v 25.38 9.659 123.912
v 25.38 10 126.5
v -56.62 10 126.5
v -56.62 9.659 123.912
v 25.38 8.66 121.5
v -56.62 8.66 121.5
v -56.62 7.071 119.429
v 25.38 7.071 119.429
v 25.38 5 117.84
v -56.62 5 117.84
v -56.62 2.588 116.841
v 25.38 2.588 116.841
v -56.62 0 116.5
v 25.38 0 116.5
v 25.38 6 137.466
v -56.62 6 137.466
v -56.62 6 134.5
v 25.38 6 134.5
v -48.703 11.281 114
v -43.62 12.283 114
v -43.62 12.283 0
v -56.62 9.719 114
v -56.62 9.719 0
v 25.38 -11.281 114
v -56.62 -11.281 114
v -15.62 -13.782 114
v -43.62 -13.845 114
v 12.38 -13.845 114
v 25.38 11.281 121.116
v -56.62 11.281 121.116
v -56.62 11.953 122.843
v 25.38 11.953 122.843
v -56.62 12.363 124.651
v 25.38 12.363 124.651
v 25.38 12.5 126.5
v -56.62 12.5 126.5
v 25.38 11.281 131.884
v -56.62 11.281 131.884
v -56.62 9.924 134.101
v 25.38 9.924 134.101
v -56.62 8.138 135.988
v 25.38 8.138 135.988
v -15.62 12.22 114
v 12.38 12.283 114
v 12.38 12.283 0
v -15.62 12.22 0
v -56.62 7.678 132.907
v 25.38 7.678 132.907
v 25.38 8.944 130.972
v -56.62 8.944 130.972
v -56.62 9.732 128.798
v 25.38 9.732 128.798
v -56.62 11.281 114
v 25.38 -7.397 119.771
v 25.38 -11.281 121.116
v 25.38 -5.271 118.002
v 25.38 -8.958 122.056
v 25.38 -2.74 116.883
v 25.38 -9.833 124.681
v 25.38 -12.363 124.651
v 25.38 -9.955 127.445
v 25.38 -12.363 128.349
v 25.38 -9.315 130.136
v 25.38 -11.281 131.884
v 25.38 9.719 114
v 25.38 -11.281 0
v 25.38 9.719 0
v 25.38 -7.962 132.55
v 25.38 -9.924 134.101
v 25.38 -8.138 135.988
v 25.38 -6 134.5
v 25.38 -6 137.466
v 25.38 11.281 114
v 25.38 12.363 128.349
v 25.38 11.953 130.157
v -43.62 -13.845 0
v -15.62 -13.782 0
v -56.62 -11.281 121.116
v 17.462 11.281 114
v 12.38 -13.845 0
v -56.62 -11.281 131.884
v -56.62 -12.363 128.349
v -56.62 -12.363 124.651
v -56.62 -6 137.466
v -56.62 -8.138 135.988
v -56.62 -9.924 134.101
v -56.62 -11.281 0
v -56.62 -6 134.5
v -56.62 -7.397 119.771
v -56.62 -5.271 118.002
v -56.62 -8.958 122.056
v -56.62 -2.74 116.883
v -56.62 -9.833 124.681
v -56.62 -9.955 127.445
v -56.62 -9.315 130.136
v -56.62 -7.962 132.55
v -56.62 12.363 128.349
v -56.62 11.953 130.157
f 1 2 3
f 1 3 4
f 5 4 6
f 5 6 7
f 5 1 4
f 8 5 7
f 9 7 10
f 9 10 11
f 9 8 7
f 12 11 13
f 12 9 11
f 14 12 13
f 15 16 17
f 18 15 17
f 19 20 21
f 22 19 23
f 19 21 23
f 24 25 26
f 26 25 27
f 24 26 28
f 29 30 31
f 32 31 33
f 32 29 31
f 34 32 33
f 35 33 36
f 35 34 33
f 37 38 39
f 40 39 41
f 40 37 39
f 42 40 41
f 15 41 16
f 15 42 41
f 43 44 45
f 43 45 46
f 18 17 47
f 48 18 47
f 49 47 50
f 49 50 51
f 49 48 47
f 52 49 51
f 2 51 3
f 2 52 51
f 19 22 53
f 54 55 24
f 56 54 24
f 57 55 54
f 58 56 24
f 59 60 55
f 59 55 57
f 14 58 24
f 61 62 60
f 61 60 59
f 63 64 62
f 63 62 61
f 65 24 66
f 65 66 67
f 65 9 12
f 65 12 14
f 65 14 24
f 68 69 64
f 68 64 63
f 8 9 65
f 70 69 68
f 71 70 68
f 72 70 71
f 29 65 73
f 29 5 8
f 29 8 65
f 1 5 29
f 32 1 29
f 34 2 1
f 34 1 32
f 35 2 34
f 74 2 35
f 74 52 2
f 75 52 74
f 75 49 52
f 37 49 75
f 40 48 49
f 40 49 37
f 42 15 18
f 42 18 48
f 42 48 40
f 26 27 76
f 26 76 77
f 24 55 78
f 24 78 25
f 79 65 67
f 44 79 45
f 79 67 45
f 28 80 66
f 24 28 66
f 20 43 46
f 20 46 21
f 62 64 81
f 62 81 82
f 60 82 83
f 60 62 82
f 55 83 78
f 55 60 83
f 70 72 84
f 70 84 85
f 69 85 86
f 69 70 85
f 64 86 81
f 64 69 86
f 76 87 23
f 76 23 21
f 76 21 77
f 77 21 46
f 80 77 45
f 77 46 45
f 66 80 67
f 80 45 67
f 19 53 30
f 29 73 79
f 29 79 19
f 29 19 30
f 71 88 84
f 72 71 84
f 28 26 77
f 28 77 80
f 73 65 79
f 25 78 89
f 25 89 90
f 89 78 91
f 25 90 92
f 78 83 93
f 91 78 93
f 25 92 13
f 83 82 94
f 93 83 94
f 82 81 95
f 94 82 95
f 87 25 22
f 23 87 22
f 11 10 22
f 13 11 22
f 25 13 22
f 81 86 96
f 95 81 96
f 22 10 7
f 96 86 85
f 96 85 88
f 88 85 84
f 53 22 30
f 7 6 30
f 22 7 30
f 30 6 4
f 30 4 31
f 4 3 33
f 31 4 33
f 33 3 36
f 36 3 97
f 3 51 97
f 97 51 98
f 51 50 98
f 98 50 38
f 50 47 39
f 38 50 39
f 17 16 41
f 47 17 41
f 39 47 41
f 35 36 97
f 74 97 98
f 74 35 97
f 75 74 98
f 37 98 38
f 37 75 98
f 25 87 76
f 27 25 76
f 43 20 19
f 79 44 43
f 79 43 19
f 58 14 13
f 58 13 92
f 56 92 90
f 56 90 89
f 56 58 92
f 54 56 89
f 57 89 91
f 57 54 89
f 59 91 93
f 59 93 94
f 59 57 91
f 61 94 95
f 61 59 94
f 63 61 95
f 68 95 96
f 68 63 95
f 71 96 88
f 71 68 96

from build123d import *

# Parameters (mm, degrees)
F1_DEPTH = 114
F3_DEPTH = 82


with BuildPart() as f1:
    # F0 (on Top) → F1 (new body)
    with BuildSketch(Plane.XY):
        Polygon((-56.6203880661, 9.7190998064), (25.3796119339, 9.7190998064), (12.379645281, 12.2834371362), (-15.6203880661, 12.22001634), (-43.6204214132, 12.2834371362), align=None)
        Polygon((-15.6203880661, -0.7809001936), (25.3796119339, -0.7809001936), (25.3796119339, 9.7190998064), (-56.6203880661, 9.7190998064), (-56.6203880661, -0.7809001936), align=None)
        Polygon((25.3796119339, -11.2809001936), (25.3796119339, -0.7809001936), (-15.6203880661, -0.7809001936), (-56.6203880661, -0.7809001936), (-56.6203880661, -11.2809001936), align=None)
        Polygon((12.379645281, -13.8452375234), (25.3796119339, -11.2809001936), (-56.6203880661, -11.2809001936), (-43.6204214132, -13.8452375234), (-15.6203880661, -13.7818167272), align=None)
    extrude(amount=F1_DEPTH)

    # F2 (on face) → F3 (join)
    with BuildSketch(Plane.YZ.offset(25.3796119339)):
        with BuildLine():
            ThreePointArc((-11.2809001936, 131.8843561195), (-12.5, 126.5), (-11.2809001936, 121.1156438805))
            Line((-11.2809001936, 121.1156438805), (-11.2809001936, 131.8843561195))
        make_face()
        with BuildLine():
            Line((-11.2809001936, 114), (0, 114))
            ThreePointArc((0, 114), (-6.6687910638, 115.9275250888), (-11.2809001936, 121.1156438805))
            Line((-11.2809001936, 121.1156438805), (-11.2809001936, 114))
        make_face()
        with BuildLine():
            ThreePointArc((-11.2809001936, 121.1156438805), (-6.6687910638, 115.9275250888), (0, 114))
            Line((0, 114), (0, 116.5))
            ThreePointArc((0, 116.5), (-9.4868329805, 123.3377223398), (-6, 134.5))
            Line((-6, 134.5), (-6, 137.4658560997))
            ThreePointArc((-6, 137.4658560997), (-9.0799594373, 135.0909450363), (-11.2809001936, 131.8843561195))
            Line((-11.2809001936, 131.8843561195), (-11.2809001936, 121.1156438805))
        make_face()
        with BuildLine():
            Line((0, 116.5), (0, 114))
            ThreePointArc((0, 114), (6.6687910638, 115.9275250888), (11.2809001936, 121.1156438805))
            Line((11.2809001936, 121.1156438805), (11.2809001936, 131.8843561195))
            ThreePointArc((11.2809001936, 131.8843561195), (9.0799594373, 135.0909450363), (6, 137.4658560997))
            Line((6, 137.4658560997), (6, 134.5))
            ThreePointArc((6, 134.5), (8.94427191, 130.972135955), (10, 126.5))
            ThreePointArc((10, 126.5), (7.0710678119, 119.4289321881), (0, 116.5))
        make_face()
        with BuildLine():
            ThreePointArc((11.2809001936, 121.1156438805), (6.6687910638, 115.9275250888), (0, 114))
            Line((0, 114), (9.7190998064, 114))
            Line((9.7190998064, 114), (11.2809001936, 114))
            Line((11.2809001936, 114), (11.2809001936, 121.1156438805))
        make_face()
        with BuildLine():
            Line((11.2809001936, 131.8843561195), (11.2809001936, 121.1156438805))
            ThreePointArc((11.2809001936, 121.1156438805), (12.1914160872, 123.7396786799), (12.5, 126.5))
            ThreePointArc((12.5, 126.5), (12.1914160872, 129.2603213201), (11.2809001936, 131.8843561195))
        make_face()
    extrude(amount=-F3_DEPTH)


solid = f1.part
